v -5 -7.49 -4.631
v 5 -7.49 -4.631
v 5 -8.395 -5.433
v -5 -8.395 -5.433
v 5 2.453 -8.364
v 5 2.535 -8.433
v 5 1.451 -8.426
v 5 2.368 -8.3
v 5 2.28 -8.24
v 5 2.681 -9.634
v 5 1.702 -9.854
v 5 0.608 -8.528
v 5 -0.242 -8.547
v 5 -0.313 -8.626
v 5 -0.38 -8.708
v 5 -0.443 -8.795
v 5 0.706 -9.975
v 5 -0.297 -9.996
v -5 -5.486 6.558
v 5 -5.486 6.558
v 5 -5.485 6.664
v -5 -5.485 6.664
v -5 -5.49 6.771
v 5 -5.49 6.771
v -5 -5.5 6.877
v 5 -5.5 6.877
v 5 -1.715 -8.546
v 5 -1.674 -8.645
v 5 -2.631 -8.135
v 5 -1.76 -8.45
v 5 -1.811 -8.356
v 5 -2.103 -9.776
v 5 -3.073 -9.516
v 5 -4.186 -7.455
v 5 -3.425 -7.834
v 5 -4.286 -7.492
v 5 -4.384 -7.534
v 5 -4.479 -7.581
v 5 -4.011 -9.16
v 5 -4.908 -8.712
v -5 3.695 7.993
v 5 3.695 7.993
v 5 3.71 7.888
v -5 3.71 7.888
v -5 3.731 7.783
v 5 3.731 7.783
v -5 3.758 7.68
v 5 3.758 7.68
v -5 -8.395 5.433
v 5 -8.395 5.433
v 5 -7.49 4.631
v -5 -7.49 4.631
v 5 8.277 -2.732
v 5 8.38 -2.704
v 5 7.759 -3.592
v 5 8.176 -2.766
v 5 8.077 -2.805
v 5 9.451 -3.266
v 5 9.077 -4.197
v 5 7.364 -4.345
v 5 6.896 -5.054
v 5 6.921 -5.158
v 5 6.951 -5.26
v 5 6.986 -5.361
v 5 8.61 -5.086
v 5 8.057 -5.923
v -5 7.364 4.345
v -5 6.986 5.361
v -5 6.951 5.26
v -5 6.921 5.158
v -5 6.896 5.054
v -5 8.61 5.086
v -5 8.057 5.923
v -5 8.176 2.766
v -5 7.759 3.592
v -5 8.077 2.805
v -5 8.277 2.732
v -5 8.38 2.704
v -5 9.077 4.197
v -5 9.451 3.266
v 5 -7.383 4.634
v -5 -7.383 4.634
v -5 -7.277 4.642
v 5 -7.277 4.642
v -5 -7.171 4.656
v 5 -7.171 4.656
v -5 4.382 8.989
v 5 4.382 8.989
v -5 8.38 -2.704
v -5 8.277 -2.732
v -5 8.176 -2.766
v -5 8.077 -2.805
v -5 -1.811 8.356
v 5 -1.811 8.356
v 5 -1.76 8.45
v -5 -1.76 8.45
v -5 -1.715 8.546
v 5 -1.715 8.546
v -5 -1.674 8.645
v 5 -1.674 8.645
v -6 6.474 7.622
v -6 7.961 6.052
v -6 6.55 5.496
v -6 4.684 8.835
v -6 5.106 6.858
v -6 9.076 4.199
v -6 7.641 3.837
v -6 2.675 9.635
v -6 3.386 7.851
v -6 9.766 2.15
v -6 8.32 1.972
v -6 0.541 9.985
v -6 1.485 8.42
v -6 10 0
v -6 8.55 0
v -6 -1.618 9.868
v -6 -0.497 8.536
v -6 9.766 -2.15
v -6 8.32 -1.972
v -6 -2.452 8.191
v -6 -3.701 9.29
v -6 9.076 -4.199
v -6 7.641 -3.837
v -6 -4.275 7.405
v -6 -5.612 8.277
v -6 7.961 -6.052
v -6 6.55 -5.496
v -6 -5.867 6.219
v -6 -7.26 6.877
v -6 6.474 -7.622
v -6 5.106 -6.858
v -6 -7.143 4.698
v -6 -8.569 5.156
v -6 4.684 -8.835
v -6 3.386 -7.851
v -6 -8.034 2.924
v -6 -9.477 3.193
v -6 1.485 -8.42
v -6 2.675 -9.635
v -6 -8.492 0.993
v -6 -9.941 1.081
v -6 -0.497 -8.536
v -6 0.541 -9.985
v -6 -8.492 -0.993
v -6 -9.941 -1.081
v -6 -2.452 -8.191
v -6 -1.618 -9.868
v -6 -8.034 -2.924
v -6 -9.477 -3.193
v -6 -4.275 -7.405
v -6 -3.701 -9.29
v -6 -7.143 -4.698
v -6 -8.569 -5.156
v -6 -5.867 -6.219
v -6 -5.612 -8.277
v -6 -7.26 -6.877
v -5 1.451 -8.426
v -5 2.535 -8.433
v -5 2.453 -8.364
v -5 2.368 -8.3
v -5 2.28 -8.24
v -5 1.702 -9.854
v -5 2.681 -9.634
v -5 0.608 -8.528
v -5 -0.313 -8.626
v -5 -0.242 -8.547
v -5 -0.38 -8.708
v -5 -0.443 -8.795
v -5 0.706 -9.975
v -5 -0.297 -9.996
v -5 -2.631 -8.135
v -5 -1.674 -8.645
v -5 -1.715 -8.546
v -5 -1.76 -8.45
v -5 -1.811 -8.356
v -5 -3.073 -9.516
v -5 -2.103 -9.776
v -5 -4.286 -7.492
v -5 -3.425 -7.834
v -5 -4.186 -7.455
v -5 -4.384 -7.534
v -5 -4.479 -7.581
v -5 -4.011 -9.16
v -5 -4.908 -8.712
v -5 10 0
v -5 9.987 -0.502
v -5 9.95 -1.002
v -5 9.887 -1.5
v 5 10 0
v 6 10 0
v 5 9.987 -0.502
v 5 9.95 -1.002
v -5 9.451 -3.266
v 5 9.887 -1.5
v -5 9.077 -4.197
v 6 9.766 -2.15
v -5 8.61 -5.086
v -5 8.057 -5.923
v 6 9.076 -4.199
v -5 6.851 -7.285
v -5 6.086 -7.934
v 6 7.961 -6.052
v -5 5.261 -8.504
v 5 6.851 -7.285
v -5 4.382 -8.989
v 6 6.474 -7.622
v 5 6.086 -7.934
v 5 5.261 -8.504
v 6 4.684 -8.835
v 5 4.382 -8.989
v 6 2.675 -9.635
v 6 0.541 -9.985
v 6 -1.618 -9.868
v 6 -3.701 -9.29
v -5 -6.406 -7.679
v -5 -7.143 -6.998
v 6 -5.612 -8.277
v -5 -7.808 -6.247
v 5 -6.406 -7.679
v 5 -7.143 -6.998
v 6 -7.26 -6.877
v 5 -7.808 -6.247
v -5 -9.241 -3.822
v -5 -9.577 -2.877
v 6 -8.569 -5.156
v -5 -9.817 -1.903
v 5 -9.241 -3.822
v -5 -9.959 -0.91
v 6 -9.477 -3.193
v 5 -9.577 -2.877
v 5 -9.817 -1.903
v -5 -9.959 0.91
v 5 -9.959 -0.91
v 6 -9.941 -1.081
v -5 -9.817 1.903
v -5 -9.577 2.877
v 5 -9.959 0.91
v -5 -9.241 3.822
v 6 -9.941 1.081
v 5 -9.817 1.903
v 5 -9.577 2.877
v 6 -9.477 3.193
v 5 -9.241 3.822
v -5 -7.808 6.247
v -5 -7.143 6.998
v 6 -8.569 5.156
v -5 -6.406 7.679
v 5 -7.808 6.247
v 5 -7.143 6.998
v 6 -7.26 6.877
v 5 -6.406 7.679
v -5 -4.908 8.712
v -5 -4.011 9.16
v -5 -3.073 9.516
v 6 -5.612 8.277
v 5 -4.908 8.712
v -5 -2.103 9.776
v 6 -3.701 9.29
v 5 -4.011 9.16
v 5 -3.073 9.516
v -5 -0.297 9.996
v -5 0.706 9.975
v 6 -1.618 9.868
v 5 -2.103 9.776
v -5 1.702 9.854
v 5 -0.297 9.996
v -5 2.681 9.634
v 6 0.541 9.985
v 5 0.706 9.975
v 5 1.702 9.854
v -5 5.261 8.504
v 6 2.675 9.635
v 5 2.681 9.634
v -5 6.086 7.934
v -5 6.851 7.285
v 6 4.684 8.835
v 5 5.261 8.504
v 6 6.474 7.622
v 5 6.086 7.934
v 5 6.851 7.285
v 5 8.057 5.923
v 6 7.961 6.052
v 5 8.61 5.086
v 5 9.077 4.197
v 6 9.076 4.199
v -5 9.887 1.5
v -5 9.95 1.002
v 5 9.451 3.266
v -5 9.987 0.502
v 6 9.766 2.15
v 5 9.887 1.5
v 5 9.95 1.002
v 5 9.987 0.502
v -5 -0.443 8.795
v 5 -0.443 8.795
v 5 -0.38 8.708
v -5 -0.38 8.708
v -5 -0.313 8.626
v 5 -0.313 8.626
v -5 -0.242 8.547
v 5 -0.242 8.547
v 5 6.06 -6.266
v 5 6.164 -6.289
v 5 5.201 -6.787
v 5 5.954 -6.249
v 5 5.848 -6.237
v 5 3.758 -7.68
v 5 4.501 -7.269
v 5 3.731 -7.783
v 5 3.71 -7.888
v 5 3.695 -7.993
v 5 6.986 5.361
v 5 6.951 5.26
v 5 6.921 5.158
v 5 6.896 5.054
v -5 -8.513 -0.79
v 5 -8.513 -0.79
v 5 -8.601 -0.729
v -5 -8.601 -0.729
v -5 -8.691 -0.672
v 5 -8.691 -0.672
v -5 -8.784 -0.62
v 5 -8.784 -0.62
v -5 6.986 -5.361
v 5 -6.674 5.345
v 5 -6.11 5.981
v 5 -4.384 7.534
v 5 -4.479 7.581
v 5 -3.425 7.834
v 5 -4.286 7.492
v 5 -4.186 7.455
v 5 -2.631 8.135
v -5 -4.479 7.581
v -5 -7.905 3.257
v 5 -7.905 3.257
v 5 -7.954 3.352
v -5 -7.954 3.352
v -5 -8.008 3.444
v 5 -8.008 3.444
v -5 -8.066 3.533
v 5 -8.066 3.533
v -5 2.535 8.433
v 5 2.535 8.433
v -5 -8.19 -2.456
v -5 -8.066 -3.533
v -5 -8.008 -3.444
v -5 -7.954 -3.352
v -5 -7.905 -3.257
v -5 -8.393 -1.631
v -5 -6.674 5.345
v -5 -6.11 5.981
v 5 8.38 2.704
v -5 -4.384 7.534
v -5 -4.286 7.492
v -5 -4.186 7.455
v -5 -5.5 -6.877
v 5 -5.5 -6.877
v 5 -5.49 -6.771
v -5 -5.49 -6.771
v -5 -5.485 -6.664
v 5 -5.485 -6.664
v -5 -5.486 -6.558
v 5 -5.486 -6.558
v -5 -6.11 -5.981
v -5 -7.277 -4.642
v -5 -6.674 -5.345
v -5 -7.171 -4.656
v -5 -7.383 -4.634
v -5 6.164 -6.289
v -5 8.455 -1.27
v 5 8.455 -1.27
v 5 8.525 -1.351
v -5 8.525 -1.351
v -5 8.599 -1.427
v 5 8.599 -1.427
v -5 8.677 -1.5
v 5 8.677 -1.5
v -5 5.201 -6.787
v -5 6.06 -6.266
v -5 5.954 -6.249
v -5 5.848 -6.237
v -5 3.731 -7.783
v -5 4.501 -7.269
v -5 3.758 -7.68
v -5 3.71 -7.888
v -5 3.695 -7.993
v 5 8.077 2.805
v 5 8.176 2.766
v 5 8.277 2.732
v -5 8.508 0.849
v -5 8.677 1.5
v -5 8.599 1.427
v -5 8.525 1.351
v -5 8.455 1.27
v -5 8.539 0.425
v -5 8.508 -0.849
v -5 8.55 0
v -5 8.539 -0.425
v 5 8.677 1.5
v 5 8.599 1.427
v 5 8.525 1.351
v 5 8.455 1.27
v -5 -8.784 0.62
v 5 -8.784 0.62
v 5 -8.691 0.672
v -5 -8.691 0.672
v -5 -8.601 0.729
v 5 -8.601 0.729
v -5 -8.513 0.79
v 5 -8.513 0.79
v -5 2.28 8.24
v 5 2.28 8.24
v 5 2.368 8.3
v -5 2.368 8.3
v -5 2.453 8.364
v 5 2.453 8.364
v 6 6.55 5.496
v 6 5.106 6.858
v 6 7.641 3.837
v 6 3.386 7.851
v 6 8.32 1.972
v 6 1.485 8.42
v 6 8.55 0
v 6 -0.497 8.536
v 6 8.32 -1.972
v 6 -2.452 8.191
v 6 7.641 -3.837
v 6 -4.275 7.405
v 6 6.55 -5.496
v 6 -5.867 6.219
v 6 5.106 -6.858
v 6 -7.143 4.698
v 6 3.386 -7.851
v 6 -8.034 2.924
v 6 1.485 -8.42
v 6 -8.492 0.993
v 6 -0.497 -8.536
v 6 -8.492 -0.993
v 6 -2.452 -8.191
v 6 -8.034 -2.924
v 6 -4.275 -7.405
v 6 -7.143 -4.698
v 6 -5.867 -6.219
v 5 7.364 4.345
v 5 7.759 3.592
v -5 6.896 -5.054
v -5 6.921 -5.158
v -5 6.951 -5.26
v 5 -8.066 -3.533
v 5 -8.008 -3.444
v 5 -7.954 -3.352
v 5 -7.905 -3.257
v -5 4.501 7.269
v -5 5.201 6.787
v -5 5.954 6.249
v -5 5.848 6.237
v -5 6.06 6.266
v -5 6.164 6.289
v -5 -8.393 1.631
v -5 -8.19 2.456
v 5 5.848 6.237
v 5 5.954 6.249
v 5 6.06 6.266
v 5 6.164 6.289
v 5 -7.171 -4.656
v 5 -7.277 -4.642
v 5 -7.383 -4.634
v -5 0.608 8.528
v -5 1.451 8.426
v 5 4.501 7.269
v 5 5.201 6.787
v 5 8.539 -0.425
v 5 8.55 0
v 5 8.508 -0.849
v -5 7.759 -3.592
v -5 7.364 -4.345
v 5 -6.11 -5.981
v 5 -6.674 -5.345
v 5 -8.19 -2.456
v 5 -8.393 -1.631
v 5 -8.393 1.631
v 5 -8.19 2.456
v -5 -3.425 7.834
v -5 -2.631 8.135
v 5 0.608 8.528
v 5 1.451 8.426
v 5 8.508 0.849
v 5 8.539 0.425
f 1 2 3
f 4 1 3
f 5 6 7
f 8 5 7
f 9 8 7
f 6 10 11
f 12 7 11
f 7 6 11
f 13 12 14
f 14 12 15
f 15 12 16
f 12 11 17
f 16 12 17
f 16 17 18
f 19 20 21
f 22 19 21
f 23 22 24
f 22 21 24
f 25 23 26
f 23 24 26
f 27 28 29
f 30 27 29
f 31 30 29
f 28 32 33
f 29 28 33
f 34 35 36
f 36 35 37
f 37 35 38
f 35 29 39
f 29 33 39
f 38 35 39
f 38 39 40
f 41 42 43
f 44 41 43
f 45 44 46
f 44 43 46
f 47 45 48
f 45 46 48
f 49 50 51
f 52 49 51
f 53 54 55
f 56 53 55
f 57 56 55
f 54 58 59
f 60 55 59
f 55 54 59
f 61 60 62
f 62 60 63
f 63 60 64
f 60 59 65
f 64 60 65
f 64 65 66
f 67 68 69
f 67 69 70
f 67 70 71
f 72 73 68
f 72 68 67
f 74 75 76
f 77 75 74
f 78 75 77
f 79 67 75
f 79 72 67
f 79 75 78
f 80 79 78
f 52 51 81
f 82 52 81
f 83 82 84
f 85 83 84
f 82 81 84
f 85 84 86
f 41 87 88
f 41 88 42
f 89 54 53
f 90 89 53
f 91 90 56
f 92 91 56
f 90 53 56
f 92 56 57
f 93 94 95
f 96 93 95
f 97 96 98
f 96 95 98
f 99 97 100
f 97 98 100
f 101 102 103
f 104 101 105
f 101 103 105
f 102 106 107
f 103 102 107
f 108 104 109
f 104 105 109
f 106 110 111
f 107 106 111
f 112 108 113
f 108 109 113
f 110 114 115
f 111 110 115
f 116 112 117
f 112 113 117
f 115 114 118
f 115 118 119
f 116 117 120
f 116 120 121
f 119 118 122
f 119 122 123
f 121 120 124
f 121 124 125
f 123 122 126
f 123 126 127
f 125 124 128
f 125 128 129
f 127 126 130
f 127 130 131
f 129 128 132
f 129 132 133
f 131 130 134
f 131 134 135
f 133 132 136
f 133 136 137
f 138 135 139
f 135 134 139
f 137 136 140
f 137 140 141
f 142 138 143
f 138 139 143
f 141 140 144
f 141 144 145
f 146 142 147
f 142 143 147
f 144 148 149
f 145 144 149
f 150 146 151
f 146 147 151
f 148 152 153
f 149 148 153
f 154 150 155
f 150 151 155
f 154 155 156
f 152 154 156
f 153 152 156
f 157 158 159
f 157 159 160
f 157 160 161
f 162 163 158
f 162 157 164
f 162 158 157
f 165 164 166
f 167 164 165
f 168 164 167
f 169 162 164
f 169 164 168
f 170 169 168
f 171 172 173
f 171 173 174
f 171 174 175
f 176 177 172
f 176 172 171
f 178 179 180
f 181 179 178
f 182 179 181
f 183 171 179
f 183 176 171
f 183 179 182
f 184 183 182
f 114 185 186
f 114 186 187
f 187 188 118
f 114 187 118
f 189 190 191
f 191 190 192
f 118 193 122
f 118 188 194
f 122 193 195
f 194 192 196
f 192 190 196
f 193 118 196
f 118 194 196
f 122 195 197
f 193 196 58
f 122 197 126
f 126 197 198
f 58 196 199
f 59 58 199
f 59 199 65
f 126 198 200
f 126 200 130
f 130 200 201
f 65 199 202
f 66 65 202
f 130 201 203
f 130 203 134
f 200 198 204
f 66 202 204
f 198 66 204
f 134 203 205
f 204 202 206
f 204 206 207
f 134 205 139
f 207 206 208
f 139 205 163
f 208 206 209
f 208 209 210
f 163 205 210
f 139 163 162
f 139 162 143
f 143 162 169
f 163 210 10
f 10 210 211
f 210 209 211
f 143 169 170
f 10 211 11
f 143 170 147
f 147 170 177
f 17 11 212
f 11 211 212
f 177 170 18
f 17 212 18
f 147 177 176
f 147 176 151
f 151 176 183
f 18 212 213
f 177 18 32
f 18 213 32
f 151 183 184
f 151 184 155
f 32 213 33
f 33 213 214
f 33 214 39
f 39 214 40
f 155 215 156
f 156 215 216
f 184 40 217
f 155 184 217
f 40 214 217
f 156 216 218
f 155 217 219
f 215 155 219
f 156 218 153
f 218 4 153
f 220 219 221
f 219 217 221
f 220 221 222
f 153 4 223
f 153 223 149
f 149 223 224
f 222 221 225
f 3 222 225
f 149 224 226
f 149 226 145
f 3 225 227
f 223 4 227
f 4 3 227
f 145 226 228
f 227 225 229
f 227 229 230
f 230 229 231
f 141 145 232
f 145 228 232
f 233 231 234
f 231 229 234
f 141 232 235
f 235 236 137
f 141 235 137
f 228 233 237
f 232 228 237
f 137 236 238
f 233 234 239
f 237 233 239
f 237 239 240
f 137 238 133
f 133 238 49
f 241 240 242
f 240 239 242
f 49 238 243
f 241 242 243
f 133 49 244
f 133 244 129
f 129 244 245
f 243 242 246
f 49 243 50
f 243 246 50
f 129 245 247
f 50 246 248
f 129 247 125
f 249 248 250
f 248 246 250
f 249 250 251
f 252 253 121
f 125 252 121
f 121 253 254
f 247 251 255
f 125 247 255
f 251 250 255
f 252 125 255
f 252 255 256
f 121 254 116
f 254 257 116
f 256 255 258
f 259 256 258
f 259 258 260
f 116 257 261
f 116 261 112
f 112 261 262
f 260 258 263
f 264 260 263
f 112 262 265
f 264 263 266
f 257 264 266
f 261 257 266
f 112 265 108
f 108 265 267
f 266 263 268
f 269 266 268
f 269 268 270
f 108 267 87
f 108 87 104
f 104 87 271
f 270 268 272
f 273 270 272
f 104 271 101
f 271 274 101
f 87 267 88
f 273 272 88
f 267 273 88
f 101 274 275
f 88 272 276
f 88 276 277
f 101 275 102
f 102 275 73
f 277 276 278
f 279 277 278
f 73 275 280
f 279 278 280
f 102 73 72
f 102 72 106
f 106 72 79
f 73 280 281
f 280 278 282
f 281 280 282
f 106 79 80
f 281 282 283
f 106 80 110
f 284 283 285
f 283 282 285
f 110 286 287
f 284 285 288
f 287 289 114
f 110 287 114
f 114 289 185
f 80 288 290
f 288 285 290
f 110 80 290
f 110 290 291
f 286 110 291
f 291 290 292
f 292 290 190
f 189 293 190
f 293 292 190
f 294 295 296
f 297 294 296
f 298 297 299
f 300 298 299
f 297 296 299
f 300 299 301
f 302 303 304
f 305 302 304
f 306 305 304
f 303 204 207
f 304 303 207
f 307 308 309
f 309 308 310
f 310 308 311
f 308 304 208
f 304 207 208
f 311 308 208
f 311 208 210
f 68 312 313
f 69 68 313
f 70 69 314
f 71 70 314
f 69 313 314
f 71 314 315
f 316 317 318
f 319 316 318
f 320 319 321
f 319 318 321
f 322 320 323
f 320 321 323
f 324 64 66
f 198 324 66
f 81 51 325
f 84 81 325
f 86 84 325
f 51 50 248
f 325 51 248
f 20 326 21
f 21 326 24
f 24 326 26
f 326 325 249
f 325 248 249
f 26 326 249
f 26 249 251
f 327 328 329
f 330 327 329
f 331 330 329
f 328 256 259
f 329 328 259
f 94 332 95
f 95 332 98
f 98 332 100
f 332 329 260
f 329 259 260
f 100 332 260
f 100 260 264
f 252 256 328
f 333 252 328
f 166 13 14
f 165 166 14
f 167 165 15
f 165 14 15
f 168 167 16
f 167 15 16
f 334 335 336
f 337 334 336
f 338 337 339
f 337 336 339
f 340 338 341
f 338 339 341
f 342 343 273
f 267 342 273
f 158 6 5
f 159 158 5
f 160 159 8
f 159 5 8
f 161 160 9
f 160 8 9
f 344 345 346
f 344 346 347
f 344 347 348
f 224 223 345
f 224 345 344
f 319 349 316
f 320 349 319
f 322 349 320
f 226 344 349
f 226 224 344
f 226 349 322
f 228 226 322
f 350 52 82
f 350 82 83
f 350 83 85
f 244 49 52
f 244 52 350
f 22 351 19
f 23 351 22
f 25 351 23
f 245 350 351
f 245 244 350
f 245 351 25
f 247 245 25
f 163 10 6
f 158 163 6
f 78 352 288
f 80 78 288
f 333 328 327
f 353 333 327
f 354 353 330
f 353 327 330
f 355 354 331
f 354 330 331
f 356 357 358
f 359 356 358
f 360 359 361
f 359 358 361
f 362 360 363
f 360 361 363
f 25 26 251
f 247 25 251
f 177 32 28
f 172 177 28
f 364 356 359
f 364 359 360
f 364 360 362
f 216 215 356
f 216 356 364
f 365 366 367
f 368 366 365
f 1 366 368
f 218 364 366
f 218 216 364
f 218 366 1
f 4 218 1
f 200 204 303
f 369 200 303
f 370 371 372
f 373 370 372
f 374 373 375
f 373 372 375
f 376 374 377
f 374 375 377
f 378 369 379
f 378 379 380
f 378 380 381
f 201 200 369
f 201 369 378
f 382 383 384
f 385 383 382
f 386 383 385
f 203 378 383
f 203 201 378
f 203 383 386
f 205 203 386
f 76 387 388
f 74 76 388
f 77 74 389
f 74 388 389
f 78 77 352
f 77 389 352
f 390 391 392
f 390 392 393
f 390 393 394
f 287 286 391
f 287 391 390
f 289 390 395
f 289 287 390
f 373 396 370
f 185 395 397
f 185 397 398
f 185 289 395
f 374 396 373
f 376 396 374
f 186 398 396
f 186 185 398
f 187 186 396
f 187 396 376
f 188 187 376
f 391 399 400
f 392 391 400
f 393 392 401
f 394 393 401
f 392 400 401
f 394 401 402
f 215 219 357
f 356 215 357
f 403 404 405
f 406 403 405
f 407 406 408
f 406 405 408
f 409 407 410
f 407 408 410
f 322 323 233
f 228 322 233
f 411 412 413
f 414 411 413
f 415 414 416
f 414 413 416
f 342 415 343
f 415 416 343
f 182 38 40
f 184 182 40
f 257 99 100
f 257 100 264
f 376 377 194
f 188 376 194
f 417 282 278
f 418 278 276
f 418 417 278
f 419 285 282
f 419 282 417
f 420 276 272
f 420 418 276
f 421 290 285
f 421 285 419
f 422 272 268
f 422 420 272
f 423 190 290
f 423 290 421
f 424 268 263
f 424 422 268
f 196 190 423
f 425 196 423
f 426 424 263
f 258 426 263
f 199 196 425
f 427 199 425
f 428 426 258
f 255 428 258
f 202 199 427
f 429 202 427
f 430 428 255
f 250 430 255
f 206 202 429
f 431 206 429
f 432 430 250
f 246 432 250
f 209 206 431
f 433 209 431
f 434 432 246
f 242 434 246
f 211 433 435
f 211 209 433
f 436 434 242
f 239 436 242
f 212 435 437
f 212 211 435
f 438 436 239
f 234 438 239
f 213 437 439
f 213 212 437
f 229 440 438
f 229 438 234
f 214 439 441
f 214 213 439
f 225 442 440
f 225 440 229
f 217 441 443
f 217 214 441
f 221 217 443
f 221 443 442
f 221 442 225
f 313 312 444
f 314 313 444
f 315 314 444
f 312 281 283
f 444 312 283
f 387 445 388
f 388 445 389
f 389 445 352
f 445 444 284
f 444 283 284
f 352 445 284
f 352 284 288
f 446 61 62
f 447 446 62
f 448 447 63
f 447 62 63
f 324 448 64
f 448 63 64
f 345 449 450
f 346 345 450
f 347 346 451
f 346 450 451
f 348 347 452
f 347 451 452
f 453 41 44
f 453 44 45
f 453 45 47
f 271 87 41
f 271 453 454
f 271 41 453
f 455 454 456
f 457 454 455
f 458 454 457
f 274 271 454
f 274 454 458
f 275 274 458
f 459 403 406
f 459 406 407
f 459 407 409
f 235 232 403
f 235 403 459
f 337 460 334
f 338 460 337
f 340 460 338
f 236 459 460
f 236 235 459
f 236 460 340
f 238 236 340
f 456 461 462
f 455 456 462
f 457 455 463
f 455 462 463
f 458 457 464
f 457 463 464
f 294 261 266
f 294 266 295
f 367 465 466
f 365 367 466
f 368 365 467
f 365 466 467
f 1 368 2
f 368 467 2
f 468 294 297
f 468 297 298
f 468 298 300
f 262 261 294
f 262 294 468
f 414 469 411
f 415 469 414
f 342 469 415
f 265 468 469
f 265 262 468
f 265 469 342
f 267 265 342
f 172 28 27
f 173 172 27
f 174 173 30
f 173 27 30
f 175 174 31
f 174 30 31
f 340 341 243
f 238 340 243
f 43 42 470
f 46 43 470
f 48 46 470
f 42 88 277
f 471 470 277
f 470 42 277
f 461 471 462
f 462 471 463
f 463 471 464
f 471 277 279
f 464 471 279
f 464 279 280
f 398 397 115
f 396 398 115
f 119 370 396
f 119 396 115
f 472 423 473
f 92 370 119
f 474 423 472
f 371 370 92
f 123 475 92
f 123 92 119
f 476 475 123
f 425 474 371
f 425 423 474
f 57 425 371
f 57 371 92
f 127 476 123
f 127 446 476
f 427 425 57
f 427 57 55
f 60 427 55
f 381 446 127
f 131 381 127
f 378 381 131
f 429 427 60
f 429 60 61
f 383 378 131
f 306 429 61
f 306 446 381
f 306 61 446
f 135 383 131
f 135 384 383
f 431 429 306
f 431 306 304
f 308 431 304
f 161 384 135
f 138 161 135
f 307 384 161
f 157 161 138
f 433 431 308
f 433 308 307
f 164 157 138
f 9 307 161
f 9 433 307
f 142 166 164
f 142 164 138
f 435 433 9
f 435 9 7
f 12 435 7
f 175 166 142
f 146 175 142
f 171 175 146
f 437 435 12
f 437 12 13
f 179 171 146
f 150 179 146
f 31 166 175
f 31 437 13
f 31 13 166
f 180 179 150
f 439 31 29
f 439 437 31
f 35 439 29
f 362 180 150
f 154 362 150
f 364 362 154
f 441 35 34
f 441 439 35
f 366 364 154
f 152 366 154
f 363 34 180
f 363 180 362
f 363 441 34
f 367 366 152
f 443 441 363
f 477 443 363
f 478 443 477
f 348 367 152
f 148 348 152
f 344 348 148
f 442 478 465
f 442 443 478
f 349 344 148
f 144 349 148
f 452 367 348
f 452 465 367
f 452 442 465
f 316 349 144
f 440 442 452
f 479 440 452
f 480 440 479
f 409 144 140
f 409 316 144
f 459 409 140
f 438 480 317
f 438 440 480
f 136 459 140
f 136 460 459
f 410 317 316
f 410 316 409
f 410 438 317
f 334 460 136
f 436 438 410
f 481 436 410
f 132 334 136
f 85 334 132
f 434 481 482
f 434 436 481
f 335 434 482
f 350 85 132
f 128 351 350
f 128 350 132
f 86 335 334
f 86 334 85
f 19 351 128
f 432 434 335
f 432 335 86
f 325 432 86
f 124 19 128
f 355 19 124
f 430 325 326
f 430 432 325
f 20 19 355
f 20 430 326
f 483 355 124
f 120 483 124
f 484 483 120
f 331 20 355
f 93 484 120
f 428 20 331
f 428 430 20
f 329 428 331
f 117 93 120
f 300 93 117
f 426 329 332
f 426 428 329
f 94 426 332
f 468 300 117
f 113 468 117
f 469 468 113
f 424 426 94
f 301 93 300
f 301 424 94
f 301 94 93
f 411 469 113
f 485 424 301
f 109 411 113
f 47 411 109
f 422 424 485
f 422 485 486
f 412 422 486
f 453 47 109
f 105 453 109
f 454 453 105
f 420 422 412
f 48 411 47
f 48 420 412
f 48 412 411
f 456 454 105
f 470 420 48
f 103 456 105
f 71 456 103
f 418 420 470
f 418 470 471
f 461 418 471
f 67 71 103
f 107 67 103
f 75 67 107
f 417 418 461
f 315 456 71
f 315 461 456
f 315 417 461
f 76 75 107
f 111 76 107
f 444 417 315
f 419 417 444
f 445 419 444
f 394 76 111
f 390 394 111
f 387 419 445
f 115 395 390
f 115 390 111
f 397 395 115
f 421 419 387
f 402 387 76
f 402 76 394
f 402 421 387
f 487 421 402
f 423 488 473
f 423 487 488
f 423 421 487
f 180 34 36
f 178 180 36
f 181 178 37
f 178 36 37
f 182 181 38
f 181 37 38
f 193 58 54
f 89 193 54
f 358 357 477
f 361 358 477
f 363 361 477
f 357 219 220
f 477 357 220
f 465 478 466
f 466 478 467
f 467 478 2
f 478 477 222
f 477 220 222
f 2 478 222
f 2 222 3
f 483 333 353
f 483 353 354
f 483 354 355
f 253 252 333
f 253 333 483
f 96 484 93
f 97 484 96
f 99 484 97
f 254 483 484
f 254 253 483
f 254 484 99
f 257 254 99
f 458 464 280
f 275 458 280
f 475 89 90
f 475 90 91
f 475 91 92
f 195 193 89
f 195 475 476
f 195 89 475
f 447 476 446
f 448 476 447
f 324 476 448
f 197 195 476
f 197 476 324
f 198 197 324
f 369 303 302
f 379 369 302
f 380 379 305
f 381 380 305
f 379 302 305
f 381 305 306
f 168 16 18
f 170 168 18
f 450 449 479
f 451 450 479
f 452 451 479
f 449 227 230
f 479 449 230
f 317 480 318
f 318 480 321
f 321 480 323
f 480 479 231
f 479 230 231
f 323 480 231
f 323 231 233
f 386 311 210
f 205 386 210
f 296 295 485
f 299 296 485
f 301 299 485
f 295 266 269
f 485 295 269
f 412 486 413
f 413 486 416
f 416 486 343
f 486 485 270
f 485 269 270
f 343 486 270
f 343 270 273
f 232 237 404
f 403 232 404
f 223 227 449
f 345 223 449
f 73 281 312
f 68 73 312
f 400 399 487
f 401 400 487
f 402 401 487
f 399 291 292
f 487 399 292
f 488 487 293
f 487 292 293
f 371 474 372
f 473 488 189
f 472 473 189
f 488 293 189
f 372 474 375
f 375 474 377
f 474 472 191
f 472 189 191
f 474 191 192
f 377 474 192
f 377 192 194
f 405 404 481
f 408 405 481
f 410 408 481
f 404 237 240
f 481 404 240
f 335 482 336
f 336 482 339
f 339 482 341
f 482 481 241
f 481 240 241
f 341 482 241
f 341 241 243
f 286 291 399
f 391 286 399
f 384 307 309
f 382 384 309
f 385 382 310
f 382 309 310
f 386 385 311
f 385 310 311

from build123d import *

# Parameters (mm, degrees)
SCHIZZO4_W                  = 12
SCHIZZO4_H                  = 1.45
TAGLIO_ESTRUSIONE1_DEPTH    = 5
RIPETIZIONECIRCOLARE1_COUNT = 13


with BuildPart() as part:
    # Schizzo4 → Rivoluzione1 (revolve)
    with BuildSketch(Plane.XY):
        with Locations((0, 9.275)):
            Rectangle(SCHIZZO4_W, SCHIZZO4_H)
    revolve(axis=Axis((0, 0, 0), (-1, 0, 0)))

    # Schizzo6 → Taglio-Estrusione1 (cut, symmetric)
    with BuildSketch(Plane(origin=(0, 0, 0), x_dir=(0, 0, -1), z_dir=(1, 0, 0))):
        with BuildLine():
            Line((-1.5, 10), (-1.5, 8.677124344))
            ThreePointArc((-1.5, 8.677124344), (0, 8), (1.5, 8.677124344))
            Line((1.5, 8.677124344), (1.5, 10))
            ThreePointArc((1.5, 10), (0, 11.5), (-1.5, 10))
        make_face()
    taglio_estrusione1 = extrude(amount=TAGLIO_ESTRUSIONE1_DEPTH, both=True, mode=Mode.SUBTRACT)

    # RipetizioneCircolare1: Taglio-Estrusione1 ×13 about axis
    ripetizionecircolare1_axis = Axis((0, 0, 0), (1, 0, 0))
    for i in range(1, RIPETIZIONECIRCOLARE1_COUNT):
        add(taglio_estrusione1.rotate(ripetizionecircolare1_axis, i * 360 / RIPETIZIONECIRCOLARE1_COUNT), mode=Mode.SUBTRACT)


solid = part.part
